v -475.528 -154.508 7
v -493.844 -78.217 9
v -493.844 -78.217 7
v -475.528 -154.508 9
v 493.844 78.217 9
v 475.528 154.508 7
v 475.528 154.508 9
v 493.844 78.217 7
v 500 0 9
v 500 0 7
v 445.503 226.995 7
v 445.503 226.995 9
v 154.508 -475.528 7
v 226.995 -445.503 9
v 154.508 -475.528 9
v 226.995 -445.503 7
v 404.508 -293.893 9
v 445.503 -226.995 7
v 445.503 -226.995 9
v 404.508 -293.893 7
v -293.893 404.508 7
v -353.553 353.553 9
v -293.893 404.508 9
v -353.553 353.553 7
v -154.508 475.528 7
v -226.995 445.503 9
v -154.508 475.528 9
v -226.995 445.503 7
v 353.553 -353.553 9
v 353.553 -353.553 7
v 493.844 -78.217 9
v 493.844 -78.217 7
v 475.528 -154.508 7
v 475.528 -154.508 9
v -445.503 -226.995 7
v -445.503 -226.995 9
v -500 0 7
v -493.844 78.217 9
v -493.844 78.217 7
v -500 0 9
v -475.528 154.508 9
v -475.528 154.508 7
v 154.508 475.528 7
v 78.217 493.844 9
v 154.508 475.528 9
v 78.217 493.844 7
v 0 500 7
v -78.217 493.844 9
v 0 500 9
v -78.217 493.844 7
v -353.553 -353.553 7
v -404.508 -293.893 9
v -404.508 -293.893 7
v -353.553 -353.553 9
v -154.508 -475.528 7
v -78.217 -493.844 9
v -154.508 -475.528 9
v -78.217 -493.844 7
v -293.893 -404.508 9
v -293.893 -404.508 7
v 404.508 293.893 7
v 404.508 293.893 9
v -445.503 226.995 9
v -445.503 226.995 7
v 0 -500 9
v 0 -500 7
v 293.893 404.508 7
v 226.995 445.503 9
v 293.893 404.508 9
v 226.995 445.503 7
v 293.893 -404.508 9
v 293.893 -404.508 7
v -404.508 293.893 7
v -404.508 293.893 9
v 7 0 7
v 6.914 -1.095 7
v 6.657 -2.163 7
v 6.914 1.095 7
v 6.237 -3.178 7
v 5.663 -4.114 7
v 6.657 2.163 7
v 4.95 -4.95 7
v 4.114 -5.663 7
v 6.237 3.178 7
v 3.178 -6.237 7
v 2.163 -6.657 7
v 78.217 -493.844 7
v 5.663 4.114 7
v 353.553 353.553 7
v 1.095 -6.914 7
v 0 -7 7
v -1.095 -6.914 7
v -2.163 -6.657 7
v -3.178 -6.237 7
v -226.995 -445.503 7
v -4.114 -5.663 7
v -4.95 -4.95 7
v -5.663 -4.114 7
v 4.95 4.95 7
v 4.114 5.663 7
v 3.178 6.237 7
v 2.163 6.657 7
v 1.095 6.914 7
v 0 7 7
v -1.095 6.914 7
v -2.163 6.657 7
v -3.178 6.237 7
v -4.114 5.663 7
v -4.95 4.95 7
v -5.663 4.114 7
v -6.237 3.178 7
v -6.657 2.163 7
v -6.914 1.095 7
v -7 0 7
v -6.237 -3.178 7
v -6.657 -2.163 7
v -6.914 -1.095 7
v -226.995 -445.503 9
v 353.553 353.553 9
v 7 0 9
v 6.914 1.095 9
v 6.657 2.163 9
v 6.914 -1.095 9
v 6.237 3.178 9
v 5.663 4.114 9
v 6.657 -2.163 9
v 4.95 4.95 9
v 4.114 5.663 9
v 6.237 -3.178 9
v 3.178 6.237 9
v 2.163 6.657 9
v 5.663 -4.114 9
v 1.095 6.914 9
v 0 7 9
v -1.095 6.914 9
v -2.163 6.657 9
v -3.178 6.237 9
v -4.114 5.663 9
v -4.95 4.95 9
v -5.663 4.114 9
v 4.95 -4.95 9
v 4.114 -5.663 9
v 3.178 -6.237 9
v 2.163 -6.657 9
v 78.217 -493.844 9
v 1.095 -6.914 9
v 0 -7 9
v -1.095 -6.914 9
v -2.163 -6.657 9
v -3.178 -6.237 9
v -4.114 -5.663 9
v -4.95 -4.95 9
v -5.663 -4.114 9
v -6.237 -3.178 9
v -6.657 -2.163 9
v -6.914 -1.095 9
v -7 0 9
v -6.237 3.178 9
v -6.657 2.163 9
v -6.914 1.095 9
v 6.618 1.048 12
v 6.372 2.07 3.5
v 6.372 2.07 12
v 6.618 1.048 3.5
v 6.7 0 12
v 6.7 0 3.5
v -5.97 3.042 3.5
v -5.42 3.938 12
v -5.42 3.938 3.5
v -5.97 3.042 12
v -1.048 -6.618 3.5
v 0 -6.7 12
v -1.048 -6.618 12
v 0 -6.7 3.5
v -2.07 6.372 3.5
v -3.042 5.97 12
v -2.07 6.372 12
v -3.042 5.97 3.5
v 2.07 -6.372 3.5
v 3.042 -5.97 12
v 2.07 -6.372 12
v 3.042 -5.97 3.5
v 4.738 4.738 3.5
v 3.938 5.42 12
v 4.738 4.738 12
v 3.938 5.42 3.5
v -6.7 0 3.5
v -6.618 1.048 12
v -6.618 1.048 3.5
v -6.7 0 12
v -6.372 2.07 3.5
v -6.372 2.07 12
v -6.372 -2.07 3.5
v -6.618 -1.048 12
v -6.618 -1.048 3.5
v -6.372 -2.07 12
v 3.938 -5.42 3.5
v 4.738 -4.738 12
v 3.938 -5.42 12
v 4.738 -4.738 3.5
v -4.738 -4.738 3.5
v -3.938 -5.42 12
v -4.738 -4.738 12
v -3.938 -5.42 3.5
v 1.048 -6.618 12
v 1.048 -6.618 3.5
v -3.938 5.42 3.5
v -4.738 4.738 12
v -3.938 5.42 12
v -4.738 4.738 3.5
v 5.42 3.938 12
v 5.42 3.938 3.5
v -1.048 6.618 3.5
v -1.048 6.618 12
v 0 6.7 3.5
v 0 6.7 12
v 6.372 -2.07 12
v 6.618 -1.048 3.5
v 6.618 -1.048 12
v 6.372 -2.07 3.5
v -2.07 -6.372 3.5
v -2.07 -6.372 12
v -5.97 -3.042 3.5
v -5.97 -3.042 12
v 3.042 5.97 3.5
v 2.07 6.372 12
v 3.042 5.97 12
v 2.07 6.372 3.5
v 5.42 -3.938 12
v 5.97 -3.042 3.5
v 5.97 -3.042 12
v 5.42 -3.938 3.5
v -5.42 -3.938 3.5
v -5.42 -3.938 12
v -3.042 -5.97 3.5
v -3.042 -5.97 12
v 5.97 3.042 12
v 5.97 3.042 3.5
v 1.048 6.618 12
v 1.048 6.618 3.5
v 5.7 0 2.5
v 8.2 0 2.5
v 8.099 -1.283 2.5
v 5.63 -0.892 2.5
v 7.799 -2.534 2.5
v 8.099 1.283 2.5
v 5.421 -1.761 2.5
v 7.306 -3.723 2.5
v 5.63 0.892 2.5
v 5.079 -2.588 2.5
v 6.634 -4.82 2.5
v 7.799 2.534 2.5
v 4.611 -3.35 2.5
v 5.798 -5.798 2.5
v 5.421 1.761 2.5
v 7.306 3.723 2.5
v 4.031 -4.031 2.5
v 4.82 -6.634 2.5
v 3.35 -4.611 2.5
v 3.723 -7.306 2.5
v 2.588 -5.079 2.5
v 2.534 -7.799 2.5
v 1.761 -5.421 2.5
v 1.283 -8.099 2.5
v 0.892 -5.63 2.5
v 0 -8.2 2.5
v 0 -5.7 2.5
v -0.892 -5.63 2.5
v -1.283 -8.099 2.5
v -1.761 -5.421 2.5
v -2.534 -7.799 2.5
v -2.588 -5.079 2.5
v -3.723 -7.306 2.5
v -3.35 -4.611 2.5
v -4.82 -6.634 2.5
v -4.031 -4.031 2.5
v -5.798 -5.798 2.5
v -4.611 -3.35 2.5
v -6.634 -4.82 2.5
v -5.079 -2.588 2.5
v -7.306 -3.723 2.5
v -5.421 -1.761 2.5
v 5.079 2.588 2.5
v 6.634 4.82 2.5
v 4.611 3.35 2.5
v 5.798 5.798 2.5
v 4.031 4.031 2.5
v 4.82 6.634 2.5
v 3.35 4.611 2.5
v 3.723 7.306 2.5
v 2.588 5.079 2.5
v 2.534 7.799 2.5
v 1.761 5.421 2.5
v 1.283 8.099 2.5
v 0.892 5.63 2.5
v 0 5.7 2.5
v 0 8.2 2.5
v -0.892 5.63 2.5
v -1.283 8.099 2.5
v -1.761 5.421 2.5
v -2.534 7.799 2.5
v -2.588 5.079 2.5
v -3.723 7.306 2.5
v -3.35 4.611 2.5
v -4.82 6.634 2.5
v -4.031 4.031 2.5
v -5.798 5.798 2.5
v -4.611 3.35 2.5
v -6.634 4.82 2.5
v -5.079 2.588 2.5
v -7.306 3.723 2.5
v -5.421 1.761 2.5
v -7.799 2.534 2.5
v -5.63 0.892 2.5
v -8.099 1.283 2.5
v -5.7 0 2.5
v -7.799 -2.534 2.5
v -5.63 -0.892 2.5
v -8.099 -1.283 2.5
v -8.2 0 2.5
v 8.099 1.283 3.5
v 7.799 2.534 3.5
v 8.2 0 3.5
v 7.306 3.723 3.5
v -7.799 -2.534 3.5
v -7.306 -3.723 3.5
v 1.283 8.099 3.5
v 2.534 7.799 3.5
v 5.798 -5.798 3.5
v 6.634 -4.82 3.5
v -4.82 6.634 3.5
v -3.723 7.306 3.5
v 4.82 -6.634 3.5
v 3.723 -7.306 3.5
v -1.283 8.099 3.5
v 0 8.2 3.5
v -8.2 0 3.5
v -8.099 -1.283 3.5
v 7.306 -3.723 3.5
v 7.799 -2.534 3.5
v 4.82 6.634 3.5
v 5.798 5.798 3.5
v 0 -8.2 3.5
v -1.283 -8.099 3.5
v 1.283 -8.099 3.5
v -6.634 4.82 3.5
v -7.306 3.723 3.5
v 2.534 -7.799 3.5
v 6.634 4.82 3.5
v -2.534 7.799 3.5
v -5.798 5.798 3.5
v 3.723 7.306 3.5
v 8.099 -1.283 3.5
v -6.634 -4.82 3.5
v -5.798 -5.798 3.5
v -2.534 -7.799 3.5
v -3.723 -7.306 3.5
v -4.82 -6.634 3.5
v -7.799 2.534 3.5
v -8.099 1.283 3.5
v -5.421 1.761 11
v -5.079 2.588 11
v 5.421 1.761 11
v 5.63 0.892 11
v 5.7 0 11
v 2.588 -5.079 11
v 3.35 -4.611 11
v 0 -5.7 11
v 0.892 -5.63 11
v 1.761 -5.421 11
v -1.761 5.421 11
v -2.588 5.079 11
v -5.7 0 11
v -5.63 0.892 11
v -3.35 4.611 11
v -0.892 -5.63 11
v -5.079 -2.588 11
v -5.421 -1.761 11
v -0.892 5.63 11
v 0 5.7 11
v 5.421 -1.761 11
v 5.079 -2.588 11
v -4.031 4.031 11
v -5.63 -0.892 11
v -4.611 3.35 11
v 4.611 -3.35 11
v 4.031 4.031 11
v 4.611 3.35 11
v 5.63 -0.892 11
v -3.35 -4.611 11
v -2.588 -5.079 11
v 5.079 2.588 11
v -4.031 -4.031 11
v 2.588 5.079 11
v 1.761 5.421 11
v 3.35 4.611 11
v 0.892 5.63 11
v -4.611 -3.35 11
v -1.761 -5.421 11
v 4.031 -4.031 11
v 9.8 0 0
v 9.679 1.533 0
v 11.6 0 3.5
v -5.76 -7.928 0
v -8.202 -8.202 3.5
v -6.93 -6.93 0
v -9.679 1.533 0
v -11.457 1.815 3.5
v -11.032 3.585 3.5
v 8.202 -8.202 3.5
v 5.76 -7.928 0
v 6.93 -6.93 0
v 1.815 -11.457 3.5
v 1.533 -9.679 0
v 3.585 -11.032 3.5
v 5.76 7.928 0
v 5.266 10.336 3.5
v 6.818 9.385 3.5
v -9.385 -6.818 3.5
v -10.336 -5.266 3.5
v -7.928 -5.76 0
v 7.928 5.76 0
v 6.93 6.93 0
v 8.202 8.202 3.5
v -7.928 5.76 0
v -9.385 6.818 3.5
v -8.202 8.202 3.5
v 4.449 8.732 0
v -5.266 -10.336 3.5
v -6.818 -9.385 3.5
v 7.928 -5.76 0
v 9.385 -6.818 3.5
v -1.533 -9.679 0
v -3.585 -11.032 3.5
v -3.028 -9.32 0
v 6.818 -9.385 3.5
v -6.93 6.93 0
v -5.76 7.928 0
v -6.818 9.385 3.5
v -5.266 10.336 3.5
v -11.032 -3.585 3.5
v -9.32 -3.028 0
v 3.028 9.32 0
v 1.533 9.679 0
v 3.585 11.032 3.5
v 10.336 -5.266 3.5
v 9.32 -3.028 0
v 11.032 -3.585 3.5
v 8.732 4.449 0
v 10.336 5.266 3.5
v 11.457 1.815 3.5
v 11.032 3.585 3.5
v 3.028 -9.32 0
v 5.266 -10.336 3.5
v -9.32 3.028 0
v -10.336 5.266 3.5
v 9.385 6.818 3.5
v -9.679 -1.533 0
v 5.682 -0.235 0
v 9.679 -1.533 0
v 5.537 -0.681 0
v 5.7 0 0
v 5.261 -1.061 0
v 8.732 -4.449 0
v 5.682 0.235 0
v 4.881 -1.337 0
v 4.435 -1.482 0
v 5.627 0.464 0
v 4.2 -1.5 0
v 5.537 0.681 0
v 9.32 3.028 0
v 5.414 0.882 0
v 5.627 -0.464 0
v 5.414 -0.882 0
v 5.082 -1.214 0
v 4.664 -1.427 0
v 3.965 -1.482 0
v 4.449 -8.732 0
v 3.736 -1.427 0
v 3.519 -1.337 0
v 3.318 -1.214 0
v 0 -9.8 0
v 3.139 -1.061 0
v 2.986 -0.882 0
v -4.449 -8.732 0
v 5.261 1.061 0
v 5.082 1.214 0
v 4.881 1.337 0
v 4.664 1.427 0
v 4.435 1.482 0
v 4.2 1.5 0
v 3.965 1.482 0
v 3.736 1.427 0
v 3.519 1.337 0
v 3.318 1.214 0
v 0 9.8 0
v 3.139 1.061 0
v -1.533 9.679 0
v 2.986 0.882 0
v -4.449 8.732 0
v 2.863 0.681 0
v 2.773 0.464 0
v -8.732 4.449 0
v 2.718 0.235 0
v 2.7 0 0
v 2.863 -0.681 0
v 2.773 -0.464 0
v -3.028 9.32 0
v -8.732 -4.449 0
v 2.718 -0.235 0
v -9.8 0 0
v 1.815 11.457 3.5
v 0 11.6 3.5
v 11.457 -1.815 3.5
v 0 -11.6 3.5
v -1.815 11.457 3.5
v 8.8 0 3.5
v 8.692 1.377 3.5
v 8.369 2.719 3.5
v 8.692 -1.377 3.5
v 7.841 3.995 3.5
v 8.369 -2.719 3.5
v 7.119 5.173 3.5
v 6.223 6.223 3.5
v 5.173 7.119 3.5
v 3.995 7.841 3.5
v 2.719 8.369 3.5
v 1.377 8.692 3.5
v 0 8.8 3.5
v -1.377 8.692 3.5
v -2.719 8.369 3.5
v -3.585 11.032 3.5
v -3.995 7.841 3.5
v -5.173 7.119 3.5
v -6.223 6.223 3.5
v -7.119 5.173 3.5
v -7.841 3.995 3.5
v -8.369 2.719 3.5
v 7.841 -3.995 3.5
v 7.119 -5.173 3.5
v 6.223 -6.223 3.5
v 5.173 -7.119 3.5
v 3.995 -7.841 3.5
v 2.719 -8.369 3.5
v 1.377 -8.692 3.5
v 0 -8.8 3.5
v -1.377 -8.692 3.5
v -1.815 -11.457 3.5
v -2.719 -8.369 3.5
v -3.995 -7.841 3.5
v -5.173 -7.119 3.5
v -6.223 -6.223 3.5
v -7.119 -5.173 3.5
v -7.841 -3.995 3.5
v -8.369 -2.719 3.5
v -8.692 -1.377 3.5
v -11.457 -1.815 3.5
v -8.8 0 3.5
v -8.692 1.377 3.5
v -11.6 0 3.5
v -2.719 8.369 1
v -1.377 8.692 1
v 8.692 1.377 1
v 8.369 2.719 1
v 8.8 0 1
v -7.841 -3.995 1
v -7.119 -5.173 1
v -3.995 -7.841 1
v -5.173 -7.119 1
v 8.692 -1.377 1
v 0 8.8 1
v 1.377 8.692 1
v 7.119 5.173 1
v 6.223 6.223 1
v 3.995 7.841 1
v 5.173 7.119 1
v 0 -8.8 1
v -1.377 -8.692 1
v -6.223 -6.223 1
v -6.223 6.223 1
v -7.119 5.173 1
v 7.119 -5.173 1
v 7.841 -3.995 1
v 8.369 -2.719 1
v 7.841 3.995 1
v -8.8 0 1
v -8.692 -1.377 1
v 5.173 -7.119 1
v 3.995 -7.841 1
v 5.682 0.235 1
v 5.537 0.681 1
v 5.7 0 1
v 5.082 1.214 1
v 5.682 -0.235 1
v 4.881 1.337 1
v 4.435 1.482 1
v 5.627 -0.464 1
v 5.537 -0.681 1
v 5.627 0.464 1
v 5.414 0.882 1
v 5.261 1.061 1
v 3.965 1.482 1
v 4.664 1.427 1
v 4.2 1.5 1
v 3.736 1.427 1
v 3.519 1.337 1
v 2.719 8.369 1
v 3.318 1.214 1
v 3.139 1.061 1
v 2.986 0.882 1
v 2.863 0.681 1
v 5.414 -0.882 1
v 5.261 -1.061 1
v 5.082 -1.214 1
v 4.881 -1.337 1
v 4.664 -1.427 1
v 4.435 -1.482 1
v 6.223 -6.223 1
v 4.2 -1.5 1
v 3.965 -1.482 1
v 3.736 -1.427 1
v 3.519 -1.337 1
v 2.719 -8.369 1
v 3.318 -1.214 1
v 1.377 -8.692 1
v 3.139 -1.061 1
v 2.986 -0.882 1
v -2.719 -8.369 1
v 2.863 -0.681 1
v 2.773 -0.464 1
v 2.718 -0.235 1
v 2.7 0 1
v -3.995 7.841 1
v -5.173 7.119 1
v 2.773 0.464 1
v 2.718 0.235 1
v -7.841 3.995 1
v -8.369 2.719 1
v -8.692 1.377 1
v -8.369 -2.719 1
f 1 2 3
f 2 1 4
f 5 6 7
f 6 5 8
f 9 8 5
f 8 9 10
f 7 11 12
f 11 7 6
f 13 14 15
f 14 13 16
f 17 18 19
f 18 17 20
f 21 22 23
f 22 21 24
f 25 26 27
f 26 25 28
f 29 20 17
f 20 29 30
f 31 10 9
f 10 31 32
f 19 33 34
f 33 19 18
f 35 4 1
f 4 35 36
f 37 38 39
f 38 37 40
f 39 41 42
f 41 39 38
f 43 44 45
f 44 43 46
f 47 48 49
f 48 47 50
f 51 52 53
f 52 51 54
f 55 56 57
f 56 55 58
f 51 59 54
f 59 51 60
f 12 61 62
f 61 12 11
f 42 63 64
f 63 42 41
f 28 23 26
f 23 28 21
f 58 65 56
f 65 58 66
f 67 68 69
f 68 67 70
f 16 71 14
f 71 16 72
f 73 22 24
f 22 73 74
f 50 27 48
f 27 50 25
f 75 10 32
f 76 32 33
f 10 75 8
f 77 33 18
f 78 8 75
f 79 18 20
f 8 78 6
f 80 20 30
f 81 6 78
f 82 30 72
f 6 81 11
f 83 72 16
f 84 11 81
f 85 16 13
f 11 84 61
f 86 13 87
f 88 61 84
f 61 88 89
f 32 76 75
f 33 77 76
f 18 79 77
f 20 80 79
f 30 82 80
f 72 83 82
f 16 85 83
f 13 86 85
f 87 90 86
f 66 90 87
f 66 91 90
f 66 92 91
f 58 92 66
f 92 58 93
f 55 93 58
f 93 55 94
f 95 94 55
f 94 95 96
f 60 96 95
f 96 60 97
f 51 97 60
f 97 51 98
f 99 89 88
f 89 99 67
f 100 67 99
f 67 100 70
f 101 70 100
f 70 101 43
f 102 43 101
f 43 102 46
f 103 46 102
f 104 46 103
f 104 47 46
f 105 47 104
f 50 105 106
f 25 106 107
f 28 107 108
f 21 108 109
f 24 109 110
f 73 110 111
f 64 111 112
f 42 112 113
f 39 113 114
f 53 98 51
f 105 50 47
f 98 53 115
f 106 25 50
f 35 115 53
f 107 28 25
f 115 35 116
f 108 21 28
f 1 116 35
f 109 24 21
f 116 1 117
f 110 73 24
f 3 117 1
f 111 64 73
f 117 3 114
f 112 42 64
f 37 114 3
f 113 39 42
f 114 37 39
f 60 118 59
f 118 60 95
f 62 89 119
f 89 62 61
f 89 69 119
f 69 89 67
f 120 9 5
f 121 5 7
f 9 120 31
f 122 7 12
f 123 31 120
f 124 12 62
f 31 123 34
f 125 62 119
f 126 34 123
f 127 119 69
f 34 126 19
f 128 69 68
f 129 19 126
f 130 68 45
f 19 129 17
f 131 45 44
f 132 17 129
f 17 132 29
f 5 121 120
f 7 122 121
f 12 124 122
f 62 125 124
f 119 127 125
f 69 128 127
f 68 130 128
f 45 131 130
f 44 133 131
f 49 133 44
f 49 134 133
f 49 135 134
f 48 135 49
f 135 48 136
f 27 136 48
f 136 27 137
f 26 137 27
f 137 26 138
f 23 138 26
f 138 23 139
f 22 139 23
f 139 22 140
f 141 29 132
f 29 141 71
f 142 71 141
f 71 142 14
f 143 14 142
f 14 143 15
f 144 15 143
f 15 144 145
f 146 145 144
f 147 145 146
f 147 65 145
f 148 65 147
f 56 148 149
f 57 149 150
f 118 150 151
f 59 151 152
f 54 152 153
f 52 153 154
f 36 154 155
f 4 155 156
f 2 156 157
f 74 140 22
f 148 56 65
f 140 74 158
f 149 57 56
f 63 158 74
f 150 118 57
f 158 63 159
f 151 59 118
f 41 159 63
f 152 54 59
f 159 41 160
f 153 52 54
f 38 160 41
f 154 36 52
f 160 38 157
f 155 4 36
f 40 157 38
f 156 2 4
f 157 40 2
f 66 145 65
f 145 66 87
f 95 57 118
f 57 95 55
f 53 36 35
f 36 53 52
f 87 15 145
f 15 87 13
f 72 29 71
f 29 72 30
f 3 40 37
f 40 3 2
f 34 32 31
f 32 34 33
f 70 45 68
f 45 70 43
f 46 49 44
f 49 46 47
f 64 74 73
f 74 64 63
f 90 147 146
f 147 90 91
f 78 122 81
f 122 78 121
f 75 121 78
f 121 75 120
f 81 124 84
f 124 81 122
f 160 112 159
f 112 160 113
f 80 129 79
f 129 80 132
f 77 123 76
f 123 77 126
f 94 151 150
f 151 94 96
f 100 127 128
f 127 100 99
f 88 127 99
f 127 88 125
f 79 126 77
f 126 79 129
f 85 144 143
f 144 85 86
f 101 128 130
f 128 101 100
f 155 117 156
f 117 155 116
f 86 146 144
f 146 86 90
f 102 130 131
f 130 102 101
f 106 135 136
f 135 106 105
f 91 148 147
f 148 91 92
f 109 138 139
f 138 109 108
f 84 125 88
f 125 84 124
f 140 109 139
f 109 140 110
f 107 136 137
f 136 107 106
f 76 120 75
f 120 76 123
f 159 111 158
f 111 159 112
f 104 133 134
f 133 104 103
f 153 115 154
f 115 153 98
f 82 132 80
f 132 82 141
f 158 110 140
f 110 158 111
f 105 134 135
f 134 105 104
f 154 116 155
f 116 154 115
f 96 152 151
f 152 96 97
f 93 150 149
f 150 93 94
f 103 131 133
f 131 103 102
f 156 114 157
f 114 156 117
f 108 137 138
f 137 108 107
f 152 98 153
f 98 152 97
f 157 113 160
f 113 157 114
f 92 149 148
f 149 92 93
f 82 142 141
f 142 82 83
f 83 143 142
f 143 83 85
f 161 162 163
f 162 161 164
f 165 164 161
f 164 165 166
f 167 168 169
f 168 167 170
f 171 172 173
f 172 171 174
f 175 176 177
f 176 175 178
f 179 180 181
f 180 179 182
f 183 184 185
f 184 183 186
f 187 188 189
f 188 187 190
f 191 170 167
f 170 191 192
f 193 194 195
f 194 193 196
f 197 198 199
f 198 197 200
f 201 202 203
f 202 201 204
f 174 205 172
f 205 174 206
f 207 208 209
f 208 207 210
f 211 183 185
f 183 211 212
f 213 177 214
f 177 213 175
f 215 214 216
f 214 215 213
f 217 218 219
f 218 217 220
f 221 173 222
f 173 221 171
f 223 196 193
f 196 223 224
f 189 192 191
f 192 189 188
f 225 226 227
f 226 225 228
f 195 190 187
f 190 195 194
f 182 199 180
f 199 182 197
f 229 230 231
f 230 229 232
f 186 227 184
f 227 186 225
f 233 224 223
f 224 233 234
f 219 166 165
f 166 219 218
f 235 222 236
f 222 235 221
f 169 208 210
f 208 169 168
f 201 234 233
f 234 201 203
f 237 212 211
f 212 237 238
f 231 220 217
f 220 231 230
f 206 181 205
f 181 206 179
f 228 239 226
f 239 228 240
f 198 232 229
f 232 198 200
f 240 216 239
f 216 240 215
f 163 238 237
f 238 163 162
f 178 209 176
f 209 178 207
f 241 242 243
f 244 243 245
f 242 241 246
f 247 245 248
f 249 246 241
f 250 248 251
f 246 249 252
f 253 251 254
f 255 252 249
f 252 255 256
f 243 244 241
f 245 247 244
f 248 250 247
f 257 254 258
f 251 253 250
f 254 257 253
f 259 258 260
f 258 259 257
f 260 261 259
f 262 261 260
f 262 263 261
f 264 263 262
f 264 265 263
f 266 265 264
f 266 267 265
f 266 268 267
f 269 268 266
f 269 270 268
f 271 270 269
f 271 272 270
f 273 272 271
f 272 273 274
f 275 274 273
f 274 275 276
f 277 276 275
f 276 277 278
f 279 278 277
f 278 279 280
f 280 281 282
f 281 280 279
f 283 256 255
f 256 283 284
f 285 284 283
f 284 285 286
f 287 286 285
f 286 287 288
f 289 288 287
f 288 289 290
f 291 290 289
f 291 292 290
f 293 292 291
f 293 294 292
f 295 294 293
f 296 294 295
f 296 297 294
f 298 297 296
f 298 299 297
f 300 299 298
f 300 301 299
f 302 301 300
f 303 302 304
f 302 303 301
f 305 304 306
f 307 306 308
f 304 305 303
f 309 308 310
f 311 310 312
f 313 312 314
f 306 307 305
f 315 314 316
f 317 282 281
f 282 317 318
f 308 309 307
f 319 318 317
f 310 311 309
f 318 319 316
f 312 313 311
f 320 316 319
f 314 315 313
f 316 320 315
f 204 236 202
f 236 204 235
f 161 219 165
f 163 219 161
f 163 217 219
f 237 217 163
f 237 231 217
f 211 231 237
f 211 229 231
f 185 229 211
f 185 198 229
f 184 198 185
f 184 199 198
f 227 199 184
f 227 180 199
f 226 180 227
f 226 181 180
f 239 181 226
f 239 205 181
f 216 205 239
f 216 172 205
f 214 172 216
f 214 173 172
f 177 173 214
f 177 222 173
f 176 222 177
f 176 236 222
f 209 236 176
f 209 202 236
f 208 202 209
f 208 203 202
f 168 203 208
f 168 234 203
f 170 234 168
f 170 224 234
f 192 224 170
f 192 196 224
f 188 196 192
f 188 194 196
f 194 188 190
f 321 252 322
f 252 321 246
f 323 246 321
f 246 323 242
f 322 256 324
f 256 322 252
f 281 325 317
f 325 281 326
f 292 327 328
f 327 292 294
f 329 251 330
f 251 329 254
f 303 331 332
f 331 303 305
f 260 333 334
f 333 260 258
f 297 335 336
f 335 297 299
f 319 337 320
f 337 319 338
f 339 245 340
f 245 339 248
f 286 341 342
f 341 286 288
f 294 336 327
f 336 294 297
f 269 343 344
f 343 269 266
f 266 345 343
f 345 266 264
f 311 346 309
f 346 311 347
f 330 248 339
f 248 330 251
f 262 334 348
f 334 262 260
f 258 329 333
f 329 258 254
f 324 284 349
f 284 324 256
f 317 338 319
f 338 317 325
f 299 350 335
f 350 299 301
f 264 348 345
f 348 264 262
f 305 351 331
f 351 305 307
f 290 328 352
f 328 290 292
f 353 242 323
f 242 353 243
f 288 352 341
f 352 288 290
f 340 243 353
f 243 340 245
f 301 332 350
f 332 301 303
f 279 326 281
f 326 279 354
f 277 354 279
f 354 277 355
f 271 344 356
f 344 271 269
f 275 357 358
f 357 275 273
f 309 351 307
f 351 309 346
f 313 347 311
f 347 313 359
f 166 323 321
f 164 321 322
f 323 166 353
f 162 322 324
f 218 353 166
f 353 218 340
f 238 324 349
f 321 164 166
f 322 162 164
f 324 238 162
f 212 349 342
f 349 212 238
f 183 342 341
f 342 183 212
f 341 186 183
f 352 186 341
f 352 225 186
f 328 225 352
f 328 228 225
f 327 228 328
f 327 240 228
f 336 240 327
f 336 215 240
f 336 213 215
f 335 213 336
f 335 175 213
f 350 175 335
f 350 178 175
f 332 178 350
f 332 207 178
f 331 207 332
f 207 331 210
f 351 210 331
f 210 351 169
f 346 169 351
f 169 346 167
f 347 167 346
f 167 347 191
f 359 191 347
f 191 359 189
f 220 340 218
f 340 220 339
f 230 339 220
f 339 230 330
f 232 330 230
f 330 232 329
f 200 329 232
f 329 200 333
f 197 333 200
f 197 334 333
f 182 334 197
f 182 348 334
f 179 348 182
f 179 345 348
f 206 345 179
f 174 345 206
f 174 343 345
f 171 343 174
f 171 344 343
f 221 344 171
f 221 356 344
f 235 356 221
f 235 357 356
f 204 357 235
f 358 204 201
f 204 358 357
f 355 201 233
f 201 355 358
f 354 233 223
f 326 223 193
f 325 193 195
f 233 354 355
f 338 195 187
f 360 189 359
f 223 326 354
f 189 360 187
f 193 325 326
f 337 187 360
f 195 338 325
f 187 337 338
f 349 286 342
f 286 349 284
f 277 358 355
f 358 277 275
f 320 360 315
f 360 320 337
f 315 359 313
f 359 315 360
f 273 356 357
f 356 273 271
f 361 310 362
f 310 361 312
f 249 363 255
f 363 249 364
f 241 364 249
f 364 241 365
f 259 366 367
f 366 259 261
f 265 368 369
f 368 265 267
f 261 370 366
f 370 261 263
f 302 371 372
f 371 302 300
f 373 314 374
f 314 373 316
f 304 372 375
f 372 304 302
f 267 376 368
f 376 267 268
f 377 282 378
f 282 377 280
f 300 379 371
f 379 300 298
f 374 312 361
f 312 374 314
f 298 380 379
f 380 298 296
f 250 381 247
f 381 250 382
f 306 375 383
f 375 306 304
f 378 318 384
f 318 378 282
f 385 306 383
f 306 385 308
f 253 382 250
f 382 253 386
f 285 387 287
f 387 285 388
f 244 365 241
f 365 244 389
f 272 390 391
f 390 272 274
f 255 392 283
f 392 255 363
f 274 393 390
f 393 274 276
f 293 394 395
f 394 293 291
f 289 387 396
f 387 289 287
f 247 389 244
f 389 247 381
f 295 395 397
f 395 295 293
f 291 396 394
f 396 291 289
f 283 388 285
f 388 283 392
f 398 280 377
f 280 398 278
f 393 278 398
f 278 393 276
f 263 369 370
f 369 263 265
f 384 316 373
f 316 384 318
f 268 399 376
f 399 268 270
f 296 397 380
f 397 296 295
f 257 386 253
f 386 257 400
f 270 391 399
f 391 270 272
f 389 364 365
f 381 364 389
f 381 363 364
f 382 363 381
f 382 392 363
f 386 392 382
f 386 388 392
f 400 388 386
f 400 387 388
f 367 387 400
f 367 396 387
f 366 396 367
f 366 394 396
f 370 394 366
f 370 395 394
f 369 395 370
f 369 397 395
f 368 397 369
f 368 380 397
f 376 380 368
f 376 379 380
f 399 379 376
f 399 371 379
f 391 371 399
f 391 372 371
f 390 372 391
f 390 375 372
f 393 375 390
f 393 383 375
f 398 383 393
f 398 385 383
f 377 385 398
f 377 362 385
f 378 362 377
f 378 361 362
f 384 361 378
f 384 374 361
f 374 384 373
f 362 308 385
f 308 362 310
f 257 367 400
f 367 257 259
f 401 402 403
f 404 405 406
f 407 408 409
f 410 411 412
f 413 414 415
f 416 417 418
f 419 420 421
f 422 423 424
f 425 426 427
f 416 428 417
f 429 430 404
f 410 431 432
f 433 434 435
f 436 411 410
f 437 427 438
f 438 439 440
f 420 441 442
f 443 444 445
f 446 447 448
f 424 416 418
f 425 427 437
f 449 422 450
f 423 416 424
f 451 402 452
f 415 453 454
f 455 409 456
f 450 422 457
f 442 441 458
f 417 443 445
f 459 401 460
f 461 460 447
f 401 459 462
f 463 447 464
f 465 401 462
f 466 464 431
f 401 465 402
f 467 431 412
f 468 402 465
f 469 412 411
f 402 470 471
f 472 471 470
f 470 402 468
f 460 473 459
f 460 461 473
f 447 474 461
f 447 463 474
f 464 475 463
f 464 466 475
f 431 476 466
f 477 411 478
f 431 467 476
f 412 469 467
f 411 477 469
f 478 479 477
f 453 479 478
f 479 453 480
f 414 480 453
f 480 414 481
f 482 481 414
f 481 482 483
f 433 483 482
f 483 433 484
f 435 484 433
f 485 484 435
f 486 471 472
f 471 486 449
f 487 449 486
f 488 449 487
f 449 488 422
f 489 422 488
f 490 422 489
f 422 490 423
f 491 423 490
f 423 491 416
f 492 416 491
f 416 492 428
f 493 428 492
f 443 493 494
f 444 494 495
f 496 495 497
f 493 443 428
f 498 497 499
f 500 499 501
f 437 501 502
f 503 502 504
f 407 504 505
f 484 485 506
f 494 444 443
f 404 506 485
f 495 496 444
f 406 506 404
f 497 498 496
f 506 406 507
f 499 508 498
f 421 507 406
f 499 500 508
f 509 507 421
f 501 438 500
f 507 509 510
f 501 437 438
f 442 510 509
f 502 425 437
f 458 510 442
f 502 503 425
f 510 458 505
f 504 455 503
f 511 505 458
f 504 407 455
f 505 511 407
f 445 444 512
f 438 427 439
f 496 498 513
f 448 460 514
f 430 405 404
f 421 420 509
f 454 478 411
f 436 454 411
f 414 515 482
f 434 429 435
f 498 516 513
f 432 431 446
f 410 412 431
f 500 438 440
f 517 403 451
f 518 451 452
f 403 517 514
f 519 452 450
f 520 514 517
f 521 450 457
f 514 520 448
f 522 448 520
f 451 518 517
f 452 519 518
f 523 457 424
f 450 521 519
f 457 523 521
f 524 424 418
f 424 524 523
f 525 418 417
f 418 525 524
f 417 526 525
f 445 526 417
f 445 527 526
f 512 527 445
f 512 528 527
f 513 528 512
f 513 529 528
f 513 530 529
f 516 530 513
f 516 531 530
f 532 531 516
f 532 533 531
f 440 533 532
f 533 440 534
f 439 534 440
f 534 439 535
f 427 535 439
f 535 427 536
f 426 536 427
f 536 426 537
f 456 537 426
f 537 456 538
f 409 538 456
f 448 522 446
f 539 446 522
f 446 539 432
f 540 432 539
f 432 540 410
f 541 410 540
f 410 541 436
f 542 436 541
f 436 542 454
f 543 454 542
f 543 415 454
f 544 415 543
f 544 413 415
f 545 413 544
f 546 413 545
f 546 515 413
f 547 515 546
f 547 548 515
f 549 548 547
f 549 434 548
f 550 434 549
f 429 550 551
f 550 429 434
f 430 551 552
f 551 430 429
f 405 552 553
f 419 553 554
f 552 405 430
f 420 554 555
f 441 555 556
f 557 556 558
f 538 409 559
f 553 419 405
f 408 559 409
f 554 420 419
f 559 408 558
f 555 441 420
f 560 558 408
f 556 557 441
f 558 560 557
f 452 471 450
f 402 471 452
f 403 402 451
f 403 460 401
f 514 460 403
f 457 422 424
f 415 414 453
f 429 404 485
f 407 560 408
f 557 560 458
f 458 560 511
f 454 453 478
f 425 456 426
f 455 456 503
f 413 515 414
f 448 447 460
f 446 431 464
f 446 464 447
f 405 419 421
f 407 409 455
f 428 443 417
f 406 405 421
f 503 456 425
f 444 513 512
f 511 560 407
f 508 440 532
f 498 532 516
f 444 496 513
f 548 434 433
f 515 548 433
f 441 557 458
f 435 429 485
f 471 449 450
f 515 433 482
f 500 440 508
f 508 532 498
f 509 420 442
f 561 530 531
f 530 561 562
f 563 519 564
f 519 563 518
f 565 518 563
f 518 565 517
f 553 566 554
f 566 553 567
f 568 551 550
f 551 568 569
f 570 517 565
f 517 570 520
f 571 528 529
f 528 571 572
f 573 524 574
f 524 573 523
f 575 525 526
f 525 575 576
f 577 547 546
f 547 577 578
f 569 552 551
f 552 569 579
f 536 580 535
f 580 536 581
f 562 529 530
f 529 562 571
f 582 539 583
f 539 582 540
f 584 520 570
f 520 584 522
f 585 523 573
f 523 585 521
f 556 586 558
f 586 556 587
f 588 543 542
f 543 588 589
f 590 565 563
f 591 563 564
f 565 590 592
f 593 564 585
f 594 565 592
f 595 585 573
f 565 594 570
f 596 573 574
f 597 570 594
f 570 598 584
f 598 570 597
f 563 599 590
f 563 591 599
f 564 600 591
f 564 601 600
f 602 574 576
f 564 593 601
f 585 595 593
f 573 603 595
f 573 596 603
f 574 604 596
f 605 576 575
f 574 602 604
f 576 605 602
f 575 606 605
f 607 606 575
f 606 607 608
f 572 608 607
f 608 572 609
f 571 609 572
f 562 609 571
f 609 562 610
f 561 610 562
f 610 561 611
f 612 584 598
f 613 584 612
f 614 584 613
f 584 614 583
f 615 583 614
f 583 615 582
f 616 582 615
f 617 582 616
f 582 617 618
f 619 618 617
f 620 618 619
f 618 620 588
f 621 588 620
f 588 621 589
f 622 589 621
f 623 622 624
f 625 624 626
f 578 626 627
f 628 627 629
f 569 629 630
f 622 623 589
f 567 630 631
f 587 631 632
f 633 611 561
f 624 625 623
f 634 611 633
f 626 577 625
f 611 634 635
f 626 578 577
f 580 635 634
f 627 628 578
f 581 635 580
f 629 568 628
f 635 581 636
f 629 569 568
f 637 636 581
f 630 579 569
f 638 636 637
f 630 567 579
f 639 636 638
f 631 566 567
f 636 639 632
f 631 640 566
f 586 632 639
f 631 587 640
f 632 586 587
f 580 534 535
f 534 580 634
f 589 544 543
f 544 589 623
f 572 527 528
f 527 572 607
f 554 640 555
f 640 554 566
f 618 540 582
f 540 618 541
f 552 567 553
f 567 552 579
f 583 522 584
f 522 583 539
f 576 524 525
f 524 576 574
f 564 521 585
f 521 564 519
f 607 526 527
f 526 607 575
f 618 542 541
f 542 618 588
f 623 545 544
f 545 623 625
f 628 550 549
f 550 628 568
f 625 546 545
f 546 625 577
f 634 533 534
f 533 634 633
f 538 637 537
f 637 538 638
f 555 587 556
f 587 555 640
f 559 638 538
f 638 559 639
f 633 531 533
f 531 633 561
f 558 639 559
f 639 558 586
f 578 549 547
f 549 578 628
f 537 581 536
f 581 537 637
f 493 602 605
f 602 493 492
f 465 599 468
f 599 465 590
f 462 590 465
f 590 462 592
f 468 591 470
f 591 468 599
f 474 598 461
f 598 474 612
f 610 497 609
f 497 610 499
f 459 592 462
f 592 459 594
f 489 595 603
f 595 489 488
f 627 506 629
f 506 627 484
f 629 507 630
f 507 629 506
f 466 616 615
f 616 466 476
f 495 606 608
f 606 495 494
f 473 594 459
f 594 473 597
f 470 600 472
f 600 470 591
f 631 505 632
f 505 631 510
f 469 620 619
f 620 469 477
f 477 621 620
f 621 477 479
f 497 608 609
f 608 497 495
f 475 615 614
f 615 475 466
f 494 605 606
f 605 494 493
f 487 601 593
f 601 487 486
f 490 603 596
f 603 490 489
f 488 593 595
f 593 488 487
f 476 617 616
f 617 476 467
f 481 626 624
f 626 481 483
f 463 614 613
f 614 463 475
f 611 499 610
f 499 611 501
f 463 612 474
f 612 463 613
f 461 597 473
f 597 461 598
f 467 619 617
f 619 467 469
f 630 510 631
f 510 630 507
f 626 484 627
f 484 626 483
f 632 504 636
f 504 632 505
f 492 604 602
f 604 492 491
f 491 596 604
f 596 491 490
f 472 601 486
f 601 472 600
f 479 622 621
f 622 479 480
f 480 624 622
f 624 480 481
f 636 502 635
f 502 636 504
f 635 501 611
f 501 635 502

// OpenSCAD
$fn = 40;
e = 0.3;
s = 1;
r = 7;
bh = 10;
d = 1.5;
hr = 1.5;

translate([0,0,5+2]) difference() {
cylinder(2, 500, 500);
translate([0,0,-0.01])cylinder(2.1,r,r);
}

// main button
translate([0,0,s+d])difference(){
    union() {
        cylinder(bh+s-d,r-e,r-e);
        cylinder(s, r+4*e, r+4*e);
    }
    cylinder(bh-d,r-e-s,r-e-s);
}

// bottom part
difference(){
    union() {
        cylinder(s*2+d,r+6*e+s,r+12*e+s);        
    }
    translate([0,0,s]) cylinder(s+d+0.01,r+6*e,r+6*e);
    translate([r-s-hr-e,0,0]) cylinder(s,hr,hr);
}
